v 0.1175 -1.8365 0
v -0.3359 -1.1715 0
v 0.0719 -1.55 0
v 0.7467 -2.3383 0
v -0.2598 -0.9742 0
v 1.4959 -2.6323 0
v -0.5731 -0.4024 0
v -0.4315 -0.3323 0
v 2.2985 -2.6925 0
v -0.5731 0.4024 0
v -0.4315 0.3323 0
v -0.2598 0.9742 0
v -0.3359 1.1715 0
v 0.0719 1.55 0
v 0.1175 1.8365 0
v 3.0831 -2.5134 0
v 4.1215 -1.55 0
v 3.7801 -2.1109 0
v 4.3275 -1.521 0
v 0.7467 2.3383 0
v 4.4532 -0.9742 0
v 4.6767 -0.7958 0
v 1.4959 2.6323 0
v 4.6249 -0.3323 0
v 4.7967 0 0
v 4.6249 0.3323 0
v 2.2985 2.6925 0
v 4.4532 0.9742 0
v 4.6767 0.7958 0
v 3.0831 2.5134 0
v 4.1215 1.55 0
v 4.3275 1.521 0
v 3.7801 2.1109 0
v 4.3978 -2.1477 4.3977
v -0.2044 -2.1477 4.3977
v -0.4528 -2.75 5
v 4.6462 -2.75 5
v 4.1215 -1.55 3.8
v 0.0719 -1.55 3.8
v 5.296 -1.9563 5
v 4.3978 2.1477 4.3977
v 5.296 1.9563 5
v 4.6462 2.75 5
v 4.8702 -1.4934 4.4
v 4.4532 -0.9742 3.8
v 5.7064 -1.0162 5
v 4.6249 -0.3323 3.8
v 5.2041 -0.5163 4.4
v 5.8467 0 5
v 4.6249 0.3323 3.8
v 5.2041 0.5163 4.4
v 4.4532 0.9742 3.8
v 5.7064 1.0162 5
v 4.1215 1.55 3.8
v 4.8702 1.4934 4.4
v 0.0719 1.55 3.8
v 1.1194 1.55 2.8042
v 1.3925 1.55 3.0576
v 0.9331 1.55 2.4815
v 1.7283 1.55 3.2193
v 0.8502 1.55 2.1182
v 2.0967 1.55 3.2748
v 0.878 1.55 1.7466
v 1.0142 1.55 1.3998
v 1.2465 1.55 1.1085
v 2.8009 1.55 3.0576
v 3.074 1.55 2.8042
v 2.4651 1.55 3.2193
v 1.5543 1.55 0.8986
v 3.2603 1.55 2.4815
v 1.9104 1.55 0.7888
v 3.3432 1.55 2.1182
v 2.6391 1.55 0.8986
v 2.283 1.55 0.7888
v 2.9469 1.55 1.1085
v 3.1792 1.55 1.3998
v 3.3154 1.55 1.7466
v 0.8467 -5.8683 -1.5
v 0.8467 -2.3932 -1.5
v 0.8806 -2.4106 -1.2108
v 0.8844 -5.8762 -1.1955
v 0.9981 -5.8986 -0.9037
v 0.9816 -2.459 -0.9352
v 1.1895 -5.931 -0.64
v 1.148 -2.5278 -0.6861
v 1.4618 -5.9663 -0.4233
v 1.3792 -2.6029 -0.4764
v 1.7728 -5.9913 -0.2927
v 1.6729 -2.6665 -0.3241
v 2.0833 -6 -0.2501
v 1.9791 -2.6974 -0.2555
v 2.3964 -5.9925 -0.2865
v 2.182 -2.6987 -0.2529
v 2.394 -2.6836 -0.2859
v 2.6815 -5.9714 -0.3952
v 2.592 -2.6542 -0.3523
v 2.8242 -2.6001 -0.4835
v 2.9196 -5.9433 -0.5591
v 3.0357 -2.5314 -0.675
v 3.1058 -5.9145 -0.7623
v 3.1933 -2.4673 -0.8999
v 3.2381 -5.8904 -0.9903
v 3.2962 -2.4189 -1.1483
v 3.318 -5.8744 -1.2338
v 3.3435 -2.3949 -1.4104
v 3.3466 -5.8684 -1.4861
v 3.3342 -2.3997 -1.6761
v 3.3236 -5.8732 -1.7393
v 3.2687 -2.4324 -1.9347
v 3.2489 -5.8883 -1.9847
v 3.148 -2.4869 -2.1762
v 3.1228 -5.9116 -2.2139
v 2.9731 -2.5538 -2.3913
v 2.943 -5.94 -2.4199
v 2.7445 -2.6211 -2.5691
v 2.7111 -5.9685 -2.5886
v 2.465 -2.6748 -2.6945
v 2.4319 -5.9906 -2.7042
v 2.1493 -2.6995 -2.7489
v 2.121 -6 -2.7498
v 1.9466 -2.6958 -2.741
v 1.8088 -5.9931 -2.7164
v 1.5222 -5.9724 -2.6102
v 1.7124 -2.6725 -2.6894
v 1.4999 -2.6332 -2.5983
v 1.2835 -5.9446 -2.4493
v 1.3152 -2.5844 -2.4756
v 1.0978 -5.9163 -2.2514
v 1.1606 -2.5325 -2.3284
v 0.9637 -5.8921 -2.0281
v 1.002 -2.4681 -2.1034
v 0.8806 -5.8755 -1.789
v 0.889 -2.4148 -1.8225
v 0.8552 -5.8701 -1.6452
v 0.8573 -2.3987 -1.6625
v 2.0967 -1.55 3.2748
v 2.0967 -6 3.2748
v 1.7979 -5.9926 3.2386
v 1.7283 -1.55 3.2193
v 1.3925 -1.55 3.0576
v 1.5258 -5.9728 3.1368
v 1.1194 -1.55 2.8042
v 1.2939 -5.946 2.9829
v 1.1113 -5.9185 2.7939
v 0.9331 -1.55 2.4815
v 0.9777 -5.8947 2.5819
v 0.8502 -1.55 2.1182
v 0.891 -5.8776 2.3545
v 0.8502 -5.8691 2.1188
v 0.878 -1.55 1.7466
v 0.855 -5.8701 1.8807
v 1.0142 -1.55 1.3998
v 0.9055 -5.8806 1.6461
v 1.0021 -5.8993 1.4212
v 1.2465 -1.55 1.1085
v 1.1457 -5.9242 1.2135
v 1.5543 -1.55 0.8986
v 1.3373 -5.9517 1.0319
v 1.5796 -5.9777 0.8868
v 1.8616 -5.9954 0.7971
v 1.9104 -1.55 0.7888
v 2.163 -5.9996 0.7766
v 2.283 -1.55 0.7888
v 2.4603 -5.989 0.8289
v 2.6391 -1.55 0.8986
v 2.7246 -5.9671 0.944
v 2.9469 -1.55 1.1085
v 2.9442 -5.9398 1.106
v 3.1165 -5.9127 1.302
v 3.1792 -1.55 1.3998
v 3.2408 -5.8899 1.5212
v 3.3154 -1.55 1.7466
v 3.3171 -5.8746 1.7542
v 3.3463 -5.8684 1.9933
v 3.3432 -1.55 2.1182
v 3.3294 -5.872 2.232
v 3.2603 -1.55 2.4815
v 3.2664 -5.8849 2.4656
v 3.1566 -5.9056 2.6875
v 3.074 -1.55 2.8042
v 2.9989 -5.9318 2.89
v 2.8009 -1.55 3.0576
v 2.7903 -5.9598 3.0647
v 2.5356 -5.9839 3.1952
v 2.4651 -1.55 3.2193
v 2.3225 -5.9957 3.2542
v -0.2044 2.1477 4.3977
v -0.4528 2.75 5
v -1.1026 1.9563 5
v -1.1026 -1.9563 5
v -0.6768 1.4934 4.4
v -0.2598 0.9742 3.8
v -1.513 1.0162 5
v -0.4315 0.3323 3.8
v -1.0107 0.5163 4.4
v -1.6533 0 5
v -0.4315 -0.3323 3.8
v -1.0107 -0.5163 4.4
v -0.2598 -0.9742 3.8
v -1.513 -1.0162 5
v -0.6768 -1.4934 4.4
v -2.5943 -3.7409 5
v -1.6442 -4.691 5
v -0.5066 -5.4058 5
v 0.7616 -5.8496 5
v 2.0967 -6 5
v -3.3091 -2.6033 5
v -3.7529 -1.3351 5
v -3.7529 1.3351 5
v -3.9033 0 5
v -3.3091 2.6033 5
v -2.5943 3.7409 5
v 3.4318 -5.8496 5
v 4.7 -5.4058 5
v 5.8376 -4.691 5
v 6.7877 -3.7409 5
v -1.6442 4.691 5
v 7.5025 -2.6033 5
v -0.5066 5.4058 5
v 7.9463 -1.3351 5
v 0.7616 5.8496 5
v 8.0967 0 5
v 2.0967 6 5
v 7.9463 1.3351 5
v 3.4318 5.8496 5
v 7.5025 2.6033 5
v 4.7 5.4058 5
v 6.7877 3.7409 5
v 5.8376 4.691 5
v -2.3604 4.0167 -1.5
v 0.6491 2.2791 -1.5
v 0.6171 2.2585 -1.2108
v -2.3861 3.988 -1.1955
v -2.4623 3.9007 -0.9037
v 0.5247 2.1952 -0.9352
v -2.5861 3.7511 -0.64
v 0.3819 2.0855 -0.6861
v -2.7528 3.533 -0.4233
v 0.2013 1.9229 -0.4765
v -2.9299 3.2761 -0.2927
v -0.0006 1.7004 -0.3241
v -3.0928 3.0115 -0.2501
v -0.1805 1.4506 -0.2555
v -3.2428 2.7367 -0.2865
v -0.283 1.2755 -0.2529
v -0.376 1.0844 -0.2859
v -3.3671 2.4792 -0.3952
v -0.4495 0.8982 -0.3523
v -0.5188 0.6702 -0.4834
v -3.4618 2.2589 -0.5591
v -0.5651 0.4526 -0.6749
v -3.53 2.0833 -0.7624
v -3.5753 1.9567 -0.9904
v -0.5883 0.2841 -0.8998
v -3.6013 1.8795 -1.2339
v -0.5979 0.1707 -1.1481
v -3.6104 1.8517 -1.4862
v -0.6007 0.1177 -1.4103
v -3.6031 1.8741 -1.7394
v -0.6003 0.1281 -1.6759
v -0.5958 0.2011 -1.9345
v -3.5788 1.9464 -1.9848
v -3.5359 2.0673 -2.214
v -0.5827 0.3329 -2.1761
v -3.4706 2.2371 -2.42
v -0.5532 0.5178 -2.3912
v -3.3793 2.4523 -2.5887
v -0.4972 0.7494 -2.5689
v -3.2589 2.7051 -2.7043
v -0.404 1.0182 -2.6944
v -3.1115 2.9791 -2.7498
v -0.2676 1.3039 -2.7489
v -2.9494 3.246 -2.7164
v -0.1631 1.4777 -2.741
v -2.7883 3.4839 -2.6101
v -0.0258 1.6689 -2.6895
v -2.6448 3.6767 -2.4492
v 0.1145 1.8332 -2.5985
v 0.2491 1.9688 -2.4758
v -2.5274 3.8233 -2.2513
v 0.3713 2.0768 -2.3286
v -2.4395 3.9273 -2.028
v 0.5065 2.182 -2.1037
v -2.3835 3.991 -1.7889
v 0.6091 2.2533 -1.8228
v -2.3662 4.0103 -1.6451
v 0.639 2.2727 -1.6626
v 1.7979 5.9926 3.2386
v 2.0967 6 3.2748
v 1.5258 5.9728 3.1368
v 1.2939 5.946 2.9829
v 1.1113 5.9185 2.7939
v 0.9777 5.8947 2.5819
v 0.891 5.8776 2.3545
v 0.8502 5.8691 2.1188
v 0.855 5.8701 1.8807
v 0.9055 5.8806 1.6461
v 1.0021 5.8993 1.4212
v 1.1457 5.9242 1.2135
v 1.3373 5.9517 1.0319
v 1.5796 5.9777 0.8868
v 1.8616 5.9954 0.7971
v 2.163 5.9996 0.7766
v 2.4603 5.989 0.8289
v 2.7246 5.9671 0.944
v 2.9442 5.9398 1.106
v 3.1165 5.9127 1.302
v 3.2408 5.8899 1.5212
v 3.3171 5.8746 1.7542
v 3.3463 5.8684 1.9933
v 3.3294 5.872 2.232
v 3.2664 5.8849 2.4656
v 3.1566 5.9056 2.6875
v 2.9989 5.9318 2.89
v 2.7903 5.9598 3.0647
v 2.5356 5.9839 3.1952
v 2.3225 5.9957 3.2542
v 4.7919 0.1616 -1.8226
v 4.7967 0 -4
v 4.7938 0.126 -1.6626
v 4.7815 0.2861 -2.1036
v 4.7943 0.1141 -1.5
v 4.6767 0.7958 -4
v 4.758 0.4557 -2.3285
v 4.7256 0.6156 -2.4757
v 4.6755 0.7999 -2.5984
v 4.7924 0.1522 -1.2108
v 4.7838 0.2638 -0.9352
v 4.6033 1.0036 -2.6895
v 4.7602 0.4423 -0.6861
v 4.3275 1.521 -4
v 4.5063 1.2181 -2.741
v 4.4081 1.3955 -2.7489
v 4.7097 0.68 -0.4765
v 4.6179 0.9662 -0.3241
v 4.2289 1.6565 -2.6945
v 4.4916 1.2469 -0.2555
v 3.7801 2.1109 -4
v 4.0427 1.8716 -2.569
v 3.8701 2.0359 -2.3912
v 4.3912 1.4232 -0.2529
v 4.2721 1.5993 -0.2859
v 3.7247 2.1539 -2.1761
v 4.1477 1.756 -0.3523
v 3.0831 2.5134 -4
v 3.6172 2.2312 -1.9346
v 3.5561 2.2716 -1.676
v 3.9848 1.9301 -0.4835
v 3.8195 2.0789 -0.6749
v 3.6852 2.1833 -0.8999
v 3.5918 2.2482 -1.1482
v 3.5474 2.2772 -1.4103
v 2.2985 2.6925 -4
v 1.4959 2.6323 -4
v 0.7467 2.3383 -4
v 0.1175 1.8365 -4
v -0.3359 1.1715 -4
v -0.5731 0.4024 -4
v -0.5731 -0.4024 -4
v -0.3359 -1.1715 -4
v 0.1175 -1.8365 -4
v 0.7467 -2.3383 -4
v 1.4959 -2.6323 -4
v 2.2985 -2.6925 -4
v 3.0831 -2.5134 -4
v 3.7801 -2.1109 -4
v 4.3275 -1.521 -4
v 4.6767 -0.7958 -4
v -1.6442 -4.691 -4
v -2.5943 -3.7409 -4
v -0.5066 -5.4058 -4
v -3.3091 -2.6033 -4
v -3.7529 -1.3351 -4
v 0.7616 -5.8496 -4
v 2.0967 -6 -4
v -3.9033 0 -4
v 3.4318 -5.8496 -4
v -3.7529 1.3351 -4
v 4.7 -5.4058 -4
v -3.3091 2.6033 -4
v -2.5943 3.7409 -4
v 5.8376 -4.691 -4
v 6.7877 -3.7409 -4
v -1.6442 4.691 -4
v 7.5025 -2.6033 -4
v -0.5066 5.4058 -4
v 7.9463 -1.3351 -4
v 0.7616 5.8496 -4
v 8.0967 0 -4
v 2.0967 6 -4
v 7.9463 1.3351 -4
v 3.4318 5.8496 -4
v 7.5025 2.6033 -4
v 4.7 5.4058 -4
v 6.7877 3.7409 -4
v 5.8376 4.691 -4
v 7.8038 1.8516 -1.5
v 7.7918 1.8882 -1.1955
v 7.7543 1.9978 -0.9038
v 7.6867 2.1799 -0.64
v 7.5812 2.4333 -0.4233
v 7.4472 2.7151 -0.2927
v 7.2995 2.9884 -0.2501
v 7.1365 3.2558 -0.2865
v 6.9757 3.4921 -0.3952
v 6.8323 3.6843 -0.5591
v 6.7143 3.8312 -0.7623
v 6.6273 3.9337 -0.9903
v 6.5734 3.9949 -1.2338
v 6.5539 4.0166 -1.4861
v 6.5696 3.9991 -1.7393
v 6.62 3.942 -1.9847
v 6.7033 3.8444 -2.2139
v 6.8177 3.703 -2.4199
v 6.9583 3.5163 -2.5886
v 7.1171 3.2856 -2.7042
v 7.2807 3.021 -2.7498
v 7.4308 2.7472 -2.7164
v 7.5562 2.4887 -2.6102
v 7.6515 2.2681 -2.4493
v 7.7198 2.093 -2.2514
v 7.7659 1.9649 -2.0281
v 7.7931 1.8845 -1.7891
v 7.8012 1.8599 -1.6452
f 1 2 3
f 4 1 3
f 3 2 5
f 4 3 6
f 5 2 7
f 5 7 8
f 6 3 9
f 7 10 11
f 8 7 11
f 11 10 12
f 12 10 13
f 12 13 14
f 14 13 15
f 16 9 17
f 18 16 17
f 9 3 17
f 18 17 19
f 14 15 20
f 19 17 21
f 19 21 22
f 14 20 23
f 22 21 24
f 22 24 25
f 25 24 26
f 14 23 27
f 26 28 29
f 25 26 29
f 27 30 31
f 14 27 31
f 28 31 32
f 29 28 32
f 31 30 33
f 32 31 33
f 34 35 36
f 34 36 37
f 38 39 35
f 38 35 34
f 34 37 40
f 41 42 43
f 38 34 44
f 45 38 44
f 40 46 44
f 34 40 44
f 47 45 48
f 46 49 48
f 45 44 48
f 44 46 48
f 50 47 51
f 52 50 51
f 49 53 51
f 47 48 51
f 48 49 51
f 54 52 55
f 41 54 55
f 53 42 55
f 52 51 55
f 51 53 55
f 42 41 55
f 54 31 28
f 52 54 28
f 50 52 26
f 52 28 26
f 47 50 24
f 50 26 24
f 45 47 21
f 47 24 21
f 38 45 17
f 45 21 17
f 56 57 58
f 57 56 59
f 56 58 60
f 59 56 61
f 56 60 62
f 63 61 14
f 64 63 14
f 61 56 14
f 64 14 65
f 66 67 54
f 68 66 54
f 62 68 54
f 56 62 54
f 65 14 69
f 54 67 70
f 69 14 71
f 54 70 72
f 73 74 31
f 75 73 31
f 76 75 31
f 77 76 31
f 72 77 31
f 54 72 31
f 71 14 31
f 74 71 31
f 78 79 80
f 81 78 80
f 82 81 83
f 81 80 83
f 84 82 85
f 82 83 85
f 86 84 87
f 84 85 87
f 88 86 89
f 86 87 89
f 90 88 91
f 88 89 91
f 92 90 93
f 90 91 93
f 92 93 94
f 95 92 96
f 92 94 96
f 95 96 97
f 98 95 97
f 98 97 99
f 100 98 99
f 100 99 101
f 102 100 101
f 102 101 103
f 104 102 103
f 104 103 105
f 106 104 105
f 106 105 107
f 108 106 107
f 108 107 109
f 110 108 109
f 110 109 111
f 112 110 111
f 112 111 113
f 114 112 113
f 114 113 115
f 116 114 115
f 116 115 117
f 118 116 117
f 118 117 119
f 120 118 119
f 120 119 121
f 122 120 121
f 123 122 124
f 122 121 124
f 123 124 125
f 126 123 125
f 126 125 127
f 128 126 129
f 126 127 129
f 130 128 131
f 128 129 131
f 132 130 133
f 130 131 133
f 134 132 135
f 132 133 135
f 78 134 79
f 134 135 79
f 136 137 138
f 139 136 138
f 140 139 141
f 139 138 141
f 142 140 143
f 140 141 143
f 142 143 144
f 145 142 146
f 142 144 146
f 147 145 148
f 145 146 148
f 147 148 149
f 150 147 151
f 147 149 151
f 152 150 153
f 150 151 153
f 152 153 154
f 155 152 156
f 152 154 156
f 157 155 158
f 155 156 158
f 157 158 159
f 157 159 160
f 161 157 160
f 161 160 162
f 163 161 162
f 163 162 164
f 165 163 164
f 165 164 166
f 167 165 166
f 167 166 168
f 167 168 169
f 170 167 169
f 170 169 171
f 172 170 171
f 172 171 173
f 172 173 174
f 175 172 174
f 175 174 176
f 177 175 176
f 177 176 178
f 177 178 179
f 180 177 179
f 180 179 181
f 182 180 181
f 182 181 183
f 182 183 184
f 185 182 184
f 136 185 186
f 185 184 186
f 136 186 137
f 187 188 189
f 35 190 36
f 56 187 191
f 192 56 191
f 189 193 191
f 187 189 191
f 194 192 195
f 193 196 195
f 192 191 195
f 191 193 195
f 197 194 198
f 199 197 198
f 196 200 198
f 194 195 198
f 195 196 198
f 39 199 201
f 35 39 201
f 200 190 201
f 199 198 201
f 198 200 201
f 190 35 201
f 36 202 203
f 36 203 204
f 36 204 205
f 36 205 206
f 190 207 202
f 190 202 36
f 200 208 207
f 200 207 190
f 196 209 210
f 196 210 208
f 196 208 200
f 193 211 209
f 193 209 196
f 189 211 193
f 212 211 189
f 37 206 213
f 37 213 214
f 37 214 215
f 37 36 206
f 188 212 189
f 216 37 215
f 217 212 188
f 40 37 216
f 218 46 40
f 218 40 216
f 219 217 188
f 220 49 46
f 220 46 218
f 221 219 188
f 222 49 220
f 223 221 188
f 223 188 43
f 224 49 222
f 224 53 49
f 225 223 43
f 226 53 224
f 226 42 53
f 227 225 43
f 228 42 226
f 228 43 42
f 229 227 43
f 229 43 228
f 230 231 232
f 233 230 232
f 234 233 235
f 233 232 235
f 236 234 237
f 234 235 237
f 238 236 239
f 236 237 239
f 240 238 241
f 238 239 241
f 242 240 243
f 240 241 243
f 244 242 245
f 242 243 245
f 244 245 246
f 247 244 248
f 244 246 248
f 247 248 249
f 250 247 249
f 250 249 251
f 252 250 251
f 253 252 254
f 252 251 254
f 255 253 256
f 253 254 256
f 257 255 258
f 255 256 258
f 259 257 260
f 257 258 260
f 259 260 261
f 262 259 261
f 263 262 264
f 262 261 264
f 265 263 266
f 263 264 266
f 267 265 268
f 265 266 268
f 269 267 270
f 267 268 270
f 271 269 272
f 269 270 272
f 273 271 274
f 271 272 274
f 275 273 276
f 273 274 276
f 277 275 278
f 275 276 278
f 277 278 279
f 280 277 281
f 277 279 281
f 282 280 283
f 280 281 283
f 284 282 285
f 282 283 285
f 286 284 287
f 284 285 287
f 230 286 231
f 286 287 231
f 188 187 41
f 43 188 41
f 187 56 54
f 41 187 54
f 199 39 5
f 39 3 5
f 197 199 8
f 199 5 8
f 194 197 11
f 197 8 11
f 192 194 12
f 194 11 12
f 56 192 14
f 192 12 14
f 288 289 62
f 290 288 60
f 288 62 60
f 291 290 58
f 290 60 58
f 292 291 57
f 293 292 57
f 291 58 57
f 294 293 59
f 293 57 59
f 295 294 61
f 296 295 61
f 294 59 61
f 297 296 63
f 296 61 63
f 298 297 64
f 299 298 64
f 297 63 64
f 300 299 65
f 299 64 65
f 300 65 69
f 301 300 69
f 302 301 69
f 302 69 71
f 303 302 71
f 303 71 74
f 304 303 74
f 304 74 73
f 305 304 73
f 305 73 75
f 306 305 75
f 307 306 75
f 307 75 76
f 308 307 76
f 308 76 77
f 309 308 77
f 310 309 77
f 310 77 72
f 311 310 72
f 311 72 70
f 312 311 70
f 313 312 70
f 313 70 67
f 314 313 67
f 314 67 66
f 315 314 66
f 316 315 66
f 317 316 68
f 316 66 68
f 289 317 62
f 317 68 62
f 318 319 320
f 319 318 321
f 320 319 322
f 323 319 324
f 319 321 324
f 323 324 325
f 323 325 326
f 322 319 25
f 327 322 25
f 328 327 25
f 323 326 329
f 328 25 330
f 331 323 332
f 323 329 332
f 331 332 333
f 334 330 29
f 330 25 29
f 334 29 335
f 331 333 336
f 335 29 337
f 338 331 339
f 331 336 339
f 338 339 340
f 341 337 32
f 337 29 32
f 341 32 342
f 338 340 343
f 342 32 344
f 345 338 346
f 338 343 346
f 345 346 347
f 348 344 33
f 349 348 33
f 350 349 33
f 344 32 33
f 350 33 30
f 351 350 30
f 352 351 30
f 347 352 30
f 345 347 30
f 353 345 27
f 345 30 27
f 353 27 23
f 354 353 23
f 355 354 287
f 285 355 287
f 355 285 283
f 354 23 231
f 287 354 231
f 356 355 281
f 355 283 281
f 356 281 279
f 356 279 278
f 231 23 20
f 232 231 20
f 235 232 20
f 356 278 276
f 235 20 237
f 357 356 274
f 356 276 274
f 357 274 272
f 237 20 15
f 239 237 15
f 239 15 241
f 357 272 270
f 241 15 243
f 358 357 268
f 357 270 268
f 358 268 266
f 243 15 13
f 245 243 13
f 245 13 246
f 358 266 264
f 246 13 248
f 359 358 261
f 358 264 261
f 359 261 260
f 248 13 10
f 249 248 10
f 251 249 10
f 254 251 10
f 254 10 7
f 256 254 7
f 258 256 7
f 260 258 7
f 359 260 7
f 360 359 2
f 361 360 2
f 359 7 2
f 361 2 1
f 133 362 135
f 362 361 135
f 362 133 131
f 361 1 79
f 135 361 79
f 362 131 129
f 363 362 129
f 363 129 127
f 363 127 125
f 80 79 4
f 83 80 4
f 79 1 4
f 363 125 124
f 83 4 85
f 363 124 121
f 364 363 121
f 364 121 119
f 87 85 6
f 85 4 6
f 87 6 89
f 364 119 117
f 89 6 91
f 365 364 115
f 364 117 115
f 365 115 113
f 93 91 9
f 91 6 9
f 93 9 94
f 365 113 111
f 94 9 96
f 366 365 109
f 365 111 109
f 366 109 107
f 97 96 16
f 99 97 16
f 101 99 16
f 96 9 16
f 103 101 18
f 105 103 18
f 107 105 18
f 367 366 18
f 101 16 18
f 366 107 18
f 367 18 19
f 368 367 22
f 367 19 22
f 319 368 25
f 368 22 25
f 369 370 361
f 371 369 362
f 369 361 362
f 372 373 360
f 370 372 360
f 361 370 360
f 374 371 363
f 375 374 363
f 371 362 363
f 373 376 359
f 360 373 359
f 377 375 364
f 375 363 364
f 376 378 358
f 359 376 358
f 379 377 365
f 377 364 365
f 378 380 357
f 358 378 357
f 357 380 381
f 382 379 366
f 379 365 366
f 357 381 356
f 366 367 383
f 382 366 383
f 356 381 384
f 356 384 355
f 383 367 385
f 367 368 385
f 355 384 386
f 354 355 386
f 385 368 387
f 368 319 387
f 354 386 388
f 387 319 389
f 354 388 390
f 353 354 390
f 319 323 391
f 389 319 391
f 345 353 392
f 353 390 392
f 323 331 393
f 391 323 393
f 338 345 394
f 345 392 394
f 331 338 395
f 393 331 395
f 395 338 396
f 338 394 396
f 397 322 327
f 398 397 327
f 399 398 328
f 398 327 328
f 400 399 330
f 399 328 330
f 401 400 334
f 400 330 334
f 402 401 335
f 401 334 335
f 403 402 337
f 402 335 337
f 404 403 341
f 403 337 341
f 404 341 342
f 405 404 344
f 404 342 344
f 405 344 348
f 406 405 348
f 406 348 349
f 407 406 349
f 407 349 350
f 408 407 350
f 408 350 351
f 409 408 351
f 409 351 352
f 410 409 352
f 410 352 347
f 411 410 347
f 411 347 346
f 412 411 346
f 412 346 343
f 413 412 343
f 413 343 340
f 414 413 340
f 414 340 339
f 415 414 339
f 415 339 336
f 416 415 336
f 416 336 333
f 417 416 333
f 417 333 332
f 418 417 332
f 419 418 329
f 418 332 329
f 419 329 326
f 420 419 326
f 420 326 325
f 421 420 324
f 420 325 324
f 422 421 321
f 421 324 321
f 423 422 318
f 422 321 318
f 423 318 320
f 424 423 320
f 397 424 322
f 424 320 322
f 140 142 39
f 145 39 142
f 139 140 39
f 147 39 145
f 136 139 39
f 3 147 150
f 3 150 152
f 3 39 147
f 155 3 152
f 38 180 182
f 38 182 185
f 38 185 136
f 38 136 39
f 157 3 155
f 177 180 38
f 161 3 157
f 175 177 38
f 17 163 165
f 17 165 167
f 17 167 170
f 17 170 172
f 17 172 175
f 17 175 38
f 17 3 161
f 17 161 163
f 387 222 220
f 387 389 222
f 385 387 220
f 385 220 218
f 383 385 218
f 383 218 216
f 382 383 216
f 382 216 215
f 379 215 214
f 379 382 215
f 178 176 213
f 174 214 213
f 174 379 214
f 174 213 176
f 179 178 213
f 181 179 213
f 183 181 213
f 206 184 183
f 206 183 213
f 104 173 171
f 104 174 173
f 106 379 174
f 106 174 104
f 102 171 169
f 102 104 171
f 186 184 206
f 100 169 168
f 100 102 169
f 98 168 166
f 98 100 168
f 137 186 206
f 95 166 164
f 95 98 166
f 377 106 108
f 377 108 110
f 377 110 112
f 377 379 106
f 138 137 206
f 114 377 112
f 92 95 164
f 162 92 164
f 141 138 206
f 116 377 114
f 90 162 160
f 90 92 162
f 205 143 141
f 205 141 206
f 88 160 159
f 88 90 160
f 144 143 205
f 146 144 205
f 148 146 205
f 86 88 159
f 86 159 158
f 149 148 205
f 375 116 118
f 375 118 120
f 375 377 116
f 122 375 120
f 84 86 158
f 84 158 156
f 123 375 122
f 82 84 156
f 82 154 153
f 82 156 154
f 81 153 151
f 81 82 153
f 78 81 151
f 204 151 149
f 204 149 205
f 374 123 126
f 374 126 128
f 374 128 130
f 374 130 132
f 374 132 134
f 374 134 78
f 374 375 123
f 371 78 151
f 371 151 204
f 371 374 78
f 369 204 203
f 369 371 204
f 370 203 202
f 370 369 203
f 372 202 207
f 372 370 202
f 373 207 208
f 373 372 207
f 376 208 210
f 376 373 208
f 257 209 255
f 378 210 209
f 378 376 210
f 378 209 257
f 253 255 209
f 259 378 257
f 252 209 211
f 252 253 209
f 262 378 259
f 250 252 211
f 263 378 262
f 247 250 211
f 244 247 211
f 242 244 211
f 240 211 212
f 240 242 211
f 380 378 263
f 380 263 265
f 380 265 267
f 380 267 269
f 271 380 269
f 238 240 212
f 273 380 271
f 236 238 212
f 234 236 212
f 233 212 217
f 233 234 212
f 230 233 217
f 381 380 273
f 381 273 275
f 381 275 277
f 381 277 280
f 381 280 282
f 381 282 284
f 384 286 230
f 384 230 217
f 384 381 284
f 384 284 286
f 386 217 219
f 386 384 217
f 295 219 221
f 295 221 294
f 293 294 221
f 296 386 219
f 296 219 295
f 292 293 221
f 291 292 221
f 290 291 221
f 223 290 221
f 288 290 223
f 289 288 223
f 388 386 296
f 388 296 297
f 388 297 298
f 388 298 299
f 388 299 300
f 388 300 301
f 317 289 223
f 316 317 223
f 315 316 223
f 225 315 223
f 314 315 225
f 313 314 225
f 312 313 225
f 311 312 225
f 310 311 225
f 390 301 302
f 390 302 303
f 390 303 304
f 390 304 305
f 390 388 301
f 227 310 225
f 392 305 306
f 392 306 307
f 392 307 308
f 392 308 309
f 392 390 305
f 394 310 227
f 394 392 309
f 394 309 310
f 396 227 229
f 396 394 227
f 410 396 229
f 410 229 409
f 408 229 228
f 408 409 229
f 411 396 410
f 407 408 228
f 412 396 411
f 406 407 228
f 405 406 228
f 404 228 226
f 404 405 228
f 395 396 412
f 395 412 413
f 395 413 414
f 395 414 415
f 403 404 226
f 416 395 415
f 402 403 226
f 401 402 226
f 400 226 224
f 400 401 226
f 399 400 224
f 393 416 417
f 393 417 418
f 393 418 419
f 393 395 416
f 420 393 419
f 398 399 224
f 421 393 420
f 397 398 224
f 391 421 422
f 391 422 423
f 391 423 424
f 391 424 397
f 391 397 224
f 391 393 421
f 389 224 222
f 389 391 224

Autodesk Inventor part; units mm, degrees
ref_plane "YZ Plane" through (0, 0, 0) normal (1, 0, 0) x (0, 1, 0)
ref_plane "XZ Plane" through (0, 0, 0) normal (0, 1, 0) x (-1, 0, 0)
sketch "Sketch1" plane through (0, 0, 0) normal (0, 0, 1) x (1, 0, 0)
  line L0 (0.8467, -0.7217) -> (0.8467, 0.7217) construction
  line L1 (0.8467, 0.7217) -> (2.0967, 1.4434) construction
  line L2 (2.0967, 1.4434) -> (3.3467, 0.7217) construction
  line L3 (3.3467, 0.7217) -> (3.3467, -0.7217) construction
  line L4 (3.3467, -0.7217) -> (2.0967, -1.4434) construction
  line L5 (2.0967, -1.4434) -> (0.8467, -0.7217) construction
  circle A0 centre (2.0967, 0) radius 2.45 construction
  line L6 (4.8467, -1.5877) -> (3.4717, -2.3816) construction
  line L7 (15.0967, 3) -> (15.0967, -3) construction
  line L8 (-10.9033, 3) -> (-10.9033, -3) construction
  line L9 (-0.6533, 0) -> (-0.6533, 1.5877) construction
  circle A1 centre (2.0967, 0) radius 5
  circle A2 centre (2.0967, 0) radius 1.7 projected
  line L10 (-10.9033, -3) -> (15.0967, -3) projected
  line L11 (-10.9033, 3) -> (15.0967, 3) projected
  circle A3 centre (2.0967, 0) radius 2.7
  circle A4 centre (2.0967, 0) radius 6
  circle A5 centre (2.0967, 0) radius 2.75
  point P0 (0.4719, -0.5)
  point P1 (3.7215, -0.5)
  dimension "d10" = 5.4
  dimension "d13" = 12
ref_plane "Work Plane1" through (-20.8033, -6.3, -5.9) normal (0, 0, 1) x (1, 0, 0)
extrude "Extrusion1" add sketch "Sketch1" against normal blind 4 contours A1 L10 L11 | A1 L11 A4 L10 | L11 A1 | A1 L11 A4 | L10 A4 A1 | A1 L10 | A1 L10 A4 L11 | A5
sketch "Sketch2" plane through (2.0967, 0, 0) normal (0, 0, 1) x (1, 0, 0)
  line L0 (-2, 1.5) -> (2, 1.5) construction
  arc A0 (2.5, 0) -> (2, 1.5) centre (0, 0) ccw construction
  arc A1 (-2, 1.5) -> (-2.5, 0) centre (0, 0) ccw construction
  line L1 (2, -1.5) -> (-2, -1.5) construction
  arc A2 (-2.5, 0) -> (2.5, 0) centre (0, 0) ccw construction
  line L2 (2.0248, 1.55) -> (-2.0248, 1.55) construction
  arc A3 (-2.0248, 1.55) -> (-2.55, 0) centre (0, 0) ccw construction
  arc A4 (-2.55, 0) -> (2.55, 0) centre (0, 0) ccw construction
  arc A5 (2.55, 0) -> (2.0248, 1.55) centre (0, 0) ccw construction
  line L3 (-2.0248, 1.55) -> (2.0248, 1.55) construction
  line L4 (-2.0248, 1.55) -> (2.0248, 1.55)
  line L5 (-2.0248, -1.55) -> (2.0248, -1.55)
  arc A6 (-2.0248, 1.55) -> (-2.0248, -1.55) centre (0, 0) ccw
  arc A7 (2.0248, -1.55) -> (2.0248, 1.55) centre (0, 0) ccw
  circle A8 centre (0, 0) radius 6 projected
  point P0 (-2.0967, 0)
  dimension "d11" = 3.1
  dimension "d12" = 2.55
extrude "Extrusion2" add sketch "Sketch2" along normal blind 5
chamfer "Chamfer1" distance 1.2 angle 45 4 edges at (2.0967, 1.55, 5) (-0.4533, 0, 5) (2.0967, -1.55, 5) (4.6467, 0, 5)
sketch "Sketch3" plane through (0, 0, 0) normal (0, 1, 0) x (-1, 0, 0)
  line L0 (-4.6467, 0) -> (-4.6467, 3.8) projected
  line L1 (0.4533, 0) -> (0.4533, 3.8) projected
  line L2 (-8.0967, -4) -> (3.9033, -4) projected
  circle A0 centre (-2.0967, -1.5) radius 1.25
  line L3 (-8.0967, -4) -> (3.9033, -4) projected
  point P0 (0, 0)
  point P1 (-8.5967, 0)
  point P2 (4.4033, 0)
  dimension "d14" = 2.5
  dimension "d15" = 2.5
extrude "Extrusion3" cut sketch "Sketch3" against normal blind 10
pattern_circular "Circular Pattern1" count 3 over 360 about axis through (2.0967, 0, 0) along (0, 0, -1) of "Extrusion3"
sketch "Sketch4" plane through (0.0718, -1.55, 0) normal (0, 1, 0) x (1, 0, 0)
  line L0 (0, -3.8) -> (4.0497, -3.8) projected
  line L1 (-3.9752, -5) -> (8.0248, -5) projected
  line L2 (8.0248, 4) -> (-3.9752, 4) projected
  line L3 (4.0497, -3.8) -> (0, -3.8) projected
  line L4 (4.0497, 0) -> (4.0497, -3.8) projected
  line L5 (0, 0) -> (4.0497, 0) projected
  line L6 (0, 0) -> (0, -3.8) projected
  circle A0 centre (2.0248, -2.0248) radius 2.0248
  point P0 (-0.0718, 0)
  point P1 (7.732, 1.5)
  point P2 (-2.4323, 1.5)
  point P3 (0.7748, 1.5)
hole "Hole1" at (2.0967, -1.55, 2.0248) direction (0, -1, 0) diameter 2.5 end through all both
properties part number "30_Coupling_Screw_28BYJ_M3"
